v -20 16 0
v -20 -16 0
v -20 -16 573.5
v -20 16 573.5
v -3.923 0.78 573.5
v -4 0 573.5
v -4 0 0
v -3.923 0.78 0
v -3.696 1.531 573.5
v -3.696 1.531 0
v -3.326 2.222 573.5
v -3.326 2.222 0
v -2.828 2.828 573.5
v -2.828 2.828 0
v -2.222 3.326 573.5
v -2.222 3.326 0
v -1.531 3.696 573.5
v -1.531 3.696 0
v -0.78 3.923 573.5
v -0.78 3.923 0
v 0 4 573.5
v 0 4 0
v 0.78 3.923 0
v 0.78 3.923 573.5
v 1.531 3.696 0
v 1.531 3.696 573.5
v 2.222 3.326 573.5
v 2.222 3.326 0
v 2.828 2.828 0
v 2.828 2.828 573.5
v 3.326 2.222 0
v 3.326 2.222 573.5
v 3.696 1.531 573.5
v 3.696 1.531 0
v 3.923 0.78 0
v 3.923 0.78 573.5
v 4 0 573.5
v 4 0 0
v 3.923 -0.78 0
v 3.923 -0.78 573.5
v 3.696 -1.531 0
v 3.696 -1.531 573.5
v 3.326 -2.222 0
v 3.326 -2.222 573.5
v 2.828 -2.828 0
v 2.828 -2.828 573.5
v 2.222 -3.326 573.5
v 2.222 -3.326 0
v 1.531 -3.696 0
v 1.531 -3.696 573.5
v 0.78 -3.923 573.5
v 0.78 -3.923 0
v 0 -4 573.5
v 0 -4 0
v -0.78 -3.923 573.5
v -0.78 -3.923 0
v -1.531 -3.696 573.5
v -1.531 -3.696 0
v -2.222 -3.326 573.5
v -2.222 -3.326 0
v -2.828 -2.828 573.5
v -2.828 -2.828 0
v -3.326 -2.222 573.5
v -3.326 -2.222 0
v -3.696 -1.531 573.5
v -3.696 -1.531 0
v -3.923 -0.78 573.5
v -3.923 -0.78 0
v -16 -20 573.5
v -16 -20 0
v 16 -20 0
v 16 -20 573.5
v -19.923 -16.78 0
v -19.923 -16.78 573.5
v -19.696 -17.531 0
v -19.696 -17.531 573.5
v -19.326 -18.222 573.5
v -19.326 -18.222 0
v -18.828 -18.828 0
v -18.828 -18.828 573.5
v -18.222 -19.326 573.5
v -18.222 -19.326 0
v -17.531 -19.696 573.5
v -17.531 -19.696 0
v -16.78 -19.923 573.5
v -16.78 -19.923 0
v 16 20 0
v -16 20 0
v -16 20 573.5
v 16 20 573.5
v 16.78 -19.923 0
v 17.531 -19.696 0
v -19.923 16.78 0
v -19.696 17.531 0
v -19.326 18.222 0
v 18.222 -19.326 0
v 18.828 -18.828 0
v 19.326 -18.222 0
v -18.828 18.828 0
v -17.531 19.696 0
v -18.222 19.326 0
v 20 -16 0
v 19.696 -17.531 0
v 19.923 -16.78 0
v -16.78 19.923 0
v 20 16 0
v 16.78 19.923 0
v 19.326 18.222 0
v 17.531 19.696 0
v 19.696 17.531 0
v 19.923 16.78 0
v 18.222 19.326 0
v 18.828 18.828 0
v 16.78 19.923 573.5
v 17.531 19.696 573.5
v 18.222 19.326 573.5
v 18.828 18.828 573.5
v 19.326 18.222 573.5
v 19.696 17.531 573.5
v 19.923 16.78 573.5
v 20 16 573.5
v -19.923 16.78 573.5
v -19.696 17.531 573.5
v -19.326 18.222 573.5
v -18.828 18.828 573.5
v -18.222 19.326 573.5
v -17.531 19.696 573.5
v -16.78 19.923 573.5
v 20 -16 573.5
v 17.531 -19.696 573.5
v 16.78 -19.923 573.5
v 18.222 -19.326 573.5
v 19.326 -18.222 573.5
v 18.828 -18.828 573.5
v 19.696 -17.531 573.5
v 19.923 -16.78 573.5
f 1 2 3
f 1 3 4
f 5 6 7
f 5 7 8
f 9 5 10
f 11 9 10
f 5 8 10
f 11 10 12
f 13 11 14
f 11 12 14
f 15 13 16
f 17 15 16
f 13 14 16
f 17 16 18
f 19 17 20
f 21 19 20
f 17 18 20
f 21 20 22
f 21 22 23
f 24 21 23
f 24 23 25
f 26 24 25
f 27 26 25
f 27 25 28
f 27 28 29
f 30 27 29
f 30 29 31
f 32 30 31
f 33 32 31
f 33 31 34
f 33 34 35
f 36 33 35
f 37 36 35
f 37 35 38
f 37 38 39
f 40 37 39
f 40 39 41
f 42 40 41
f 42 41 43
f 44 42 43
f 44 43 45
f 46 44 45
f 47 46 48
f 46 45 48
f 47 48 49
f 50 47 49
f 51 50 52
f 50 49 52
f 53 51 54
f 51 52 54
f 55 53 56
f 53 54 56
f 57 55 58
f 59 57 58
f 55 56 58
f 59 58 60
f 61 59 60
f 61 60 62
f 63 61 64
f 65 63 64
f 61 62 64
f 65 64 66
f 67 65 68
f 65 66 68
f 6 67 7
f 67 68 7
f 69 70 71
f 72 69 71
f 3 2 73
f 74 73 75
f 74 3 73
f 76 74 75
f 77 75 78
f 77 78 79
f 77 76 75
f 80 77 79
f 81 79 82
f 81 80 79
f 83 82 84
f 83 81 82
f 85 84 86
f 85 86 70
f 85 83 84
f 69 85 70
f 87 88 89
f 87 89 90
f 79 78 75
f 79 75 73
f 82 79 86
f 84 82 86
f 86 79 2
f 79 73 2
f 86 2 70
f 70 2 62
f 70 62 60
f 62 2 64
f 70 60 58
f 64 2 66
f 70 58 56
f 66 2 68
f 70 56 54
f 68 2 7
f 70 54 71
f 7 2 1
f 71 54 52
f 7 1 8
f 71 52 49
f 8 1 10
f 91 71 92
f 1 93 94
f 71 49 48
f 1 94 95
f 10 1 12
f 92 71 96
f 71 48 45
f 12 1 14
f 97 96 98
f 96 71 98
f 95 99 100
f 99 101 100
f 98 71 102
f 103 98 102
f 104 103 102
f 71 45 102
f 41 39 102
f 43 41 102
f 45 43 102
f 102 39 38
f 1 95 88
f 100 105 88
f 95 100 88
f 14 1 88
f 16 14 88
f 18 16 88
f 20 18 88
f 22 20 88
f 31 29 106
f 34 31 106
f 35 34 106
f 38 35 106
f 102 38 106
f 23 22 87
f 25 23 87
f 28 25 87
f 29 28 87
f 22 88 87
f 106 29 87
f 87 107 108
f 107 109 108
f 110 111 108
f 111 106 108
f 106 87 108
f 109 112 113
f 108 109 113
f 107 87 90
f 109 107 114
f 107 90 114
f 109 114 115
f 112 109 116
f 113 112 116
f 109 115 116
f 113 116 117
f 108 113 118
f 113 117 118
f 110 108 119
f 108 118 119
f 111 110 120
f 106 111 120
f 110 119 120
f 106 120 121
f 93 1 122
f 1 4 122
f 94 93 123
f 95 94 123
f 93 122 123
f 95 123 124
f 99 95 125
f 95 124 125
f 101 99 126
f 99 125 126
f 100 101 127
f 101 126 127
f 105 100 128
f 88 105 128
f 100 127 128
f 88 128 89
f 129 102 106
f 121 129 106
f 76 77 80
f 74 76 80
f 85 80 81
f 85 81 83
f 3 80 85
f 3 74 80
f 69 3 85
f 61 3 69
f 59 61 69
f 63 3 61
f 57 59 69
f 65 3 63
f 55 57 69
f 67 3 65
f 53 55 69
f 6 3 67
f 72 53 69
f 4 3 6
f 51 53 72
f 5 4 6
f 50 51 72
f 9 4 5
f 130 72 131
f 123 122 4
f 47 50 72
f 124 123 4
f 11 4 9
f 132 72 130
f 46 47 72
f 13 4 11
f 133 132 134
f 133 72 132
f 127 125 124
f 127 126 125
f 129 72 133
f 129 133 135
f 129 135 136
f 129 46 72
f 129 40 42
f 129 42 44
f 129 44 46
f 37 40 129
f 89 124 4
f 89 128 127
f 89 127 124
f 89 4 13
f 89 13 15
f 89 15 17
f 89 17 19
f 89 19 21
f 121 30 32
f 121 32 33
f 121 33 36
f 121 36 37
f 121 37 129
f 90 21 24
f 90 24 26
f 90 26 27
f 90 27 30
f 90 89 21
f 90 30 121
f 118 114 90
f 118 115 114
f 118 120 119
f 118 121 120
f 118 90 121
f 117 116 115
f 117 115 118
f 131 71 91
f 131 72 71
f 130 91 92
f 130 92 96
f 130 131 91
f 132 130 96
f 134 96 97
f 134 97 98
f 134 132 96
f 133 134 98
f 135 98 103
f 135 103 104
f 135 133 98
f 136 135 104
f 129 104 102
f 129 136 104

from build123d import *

# Parameters (mm, degrees)
F0_W     = 40
F0_H     = 40
F1_DEPTH = 573.5
F3_D     = 8
F4_R     = 4


with BuildPart() as f1:
    # F0 (on Top) → F1 (new body)
    with BuildSketch(Plane.XY):
        Rectangle(F0_W, F0_H)
    extrude(amount=F1_DEPTH)

    # F3 (through all)
    with Locations(Plane.XY.offset(573.5)):
        with Locations((0, 0)):
            Hole(F3_D / 2)

    # F4
    f4_edges = [f1.edges().sort_by_distance(p)[0] for p in [
        (-20, -20, 286.75),
        (20, -20, 286.75),
        (20, 20, 286.75),
        (-20, 20, 286.75),
    ]]
    fillet(f4_edges, radius=F4_R)


solid = f1.part
